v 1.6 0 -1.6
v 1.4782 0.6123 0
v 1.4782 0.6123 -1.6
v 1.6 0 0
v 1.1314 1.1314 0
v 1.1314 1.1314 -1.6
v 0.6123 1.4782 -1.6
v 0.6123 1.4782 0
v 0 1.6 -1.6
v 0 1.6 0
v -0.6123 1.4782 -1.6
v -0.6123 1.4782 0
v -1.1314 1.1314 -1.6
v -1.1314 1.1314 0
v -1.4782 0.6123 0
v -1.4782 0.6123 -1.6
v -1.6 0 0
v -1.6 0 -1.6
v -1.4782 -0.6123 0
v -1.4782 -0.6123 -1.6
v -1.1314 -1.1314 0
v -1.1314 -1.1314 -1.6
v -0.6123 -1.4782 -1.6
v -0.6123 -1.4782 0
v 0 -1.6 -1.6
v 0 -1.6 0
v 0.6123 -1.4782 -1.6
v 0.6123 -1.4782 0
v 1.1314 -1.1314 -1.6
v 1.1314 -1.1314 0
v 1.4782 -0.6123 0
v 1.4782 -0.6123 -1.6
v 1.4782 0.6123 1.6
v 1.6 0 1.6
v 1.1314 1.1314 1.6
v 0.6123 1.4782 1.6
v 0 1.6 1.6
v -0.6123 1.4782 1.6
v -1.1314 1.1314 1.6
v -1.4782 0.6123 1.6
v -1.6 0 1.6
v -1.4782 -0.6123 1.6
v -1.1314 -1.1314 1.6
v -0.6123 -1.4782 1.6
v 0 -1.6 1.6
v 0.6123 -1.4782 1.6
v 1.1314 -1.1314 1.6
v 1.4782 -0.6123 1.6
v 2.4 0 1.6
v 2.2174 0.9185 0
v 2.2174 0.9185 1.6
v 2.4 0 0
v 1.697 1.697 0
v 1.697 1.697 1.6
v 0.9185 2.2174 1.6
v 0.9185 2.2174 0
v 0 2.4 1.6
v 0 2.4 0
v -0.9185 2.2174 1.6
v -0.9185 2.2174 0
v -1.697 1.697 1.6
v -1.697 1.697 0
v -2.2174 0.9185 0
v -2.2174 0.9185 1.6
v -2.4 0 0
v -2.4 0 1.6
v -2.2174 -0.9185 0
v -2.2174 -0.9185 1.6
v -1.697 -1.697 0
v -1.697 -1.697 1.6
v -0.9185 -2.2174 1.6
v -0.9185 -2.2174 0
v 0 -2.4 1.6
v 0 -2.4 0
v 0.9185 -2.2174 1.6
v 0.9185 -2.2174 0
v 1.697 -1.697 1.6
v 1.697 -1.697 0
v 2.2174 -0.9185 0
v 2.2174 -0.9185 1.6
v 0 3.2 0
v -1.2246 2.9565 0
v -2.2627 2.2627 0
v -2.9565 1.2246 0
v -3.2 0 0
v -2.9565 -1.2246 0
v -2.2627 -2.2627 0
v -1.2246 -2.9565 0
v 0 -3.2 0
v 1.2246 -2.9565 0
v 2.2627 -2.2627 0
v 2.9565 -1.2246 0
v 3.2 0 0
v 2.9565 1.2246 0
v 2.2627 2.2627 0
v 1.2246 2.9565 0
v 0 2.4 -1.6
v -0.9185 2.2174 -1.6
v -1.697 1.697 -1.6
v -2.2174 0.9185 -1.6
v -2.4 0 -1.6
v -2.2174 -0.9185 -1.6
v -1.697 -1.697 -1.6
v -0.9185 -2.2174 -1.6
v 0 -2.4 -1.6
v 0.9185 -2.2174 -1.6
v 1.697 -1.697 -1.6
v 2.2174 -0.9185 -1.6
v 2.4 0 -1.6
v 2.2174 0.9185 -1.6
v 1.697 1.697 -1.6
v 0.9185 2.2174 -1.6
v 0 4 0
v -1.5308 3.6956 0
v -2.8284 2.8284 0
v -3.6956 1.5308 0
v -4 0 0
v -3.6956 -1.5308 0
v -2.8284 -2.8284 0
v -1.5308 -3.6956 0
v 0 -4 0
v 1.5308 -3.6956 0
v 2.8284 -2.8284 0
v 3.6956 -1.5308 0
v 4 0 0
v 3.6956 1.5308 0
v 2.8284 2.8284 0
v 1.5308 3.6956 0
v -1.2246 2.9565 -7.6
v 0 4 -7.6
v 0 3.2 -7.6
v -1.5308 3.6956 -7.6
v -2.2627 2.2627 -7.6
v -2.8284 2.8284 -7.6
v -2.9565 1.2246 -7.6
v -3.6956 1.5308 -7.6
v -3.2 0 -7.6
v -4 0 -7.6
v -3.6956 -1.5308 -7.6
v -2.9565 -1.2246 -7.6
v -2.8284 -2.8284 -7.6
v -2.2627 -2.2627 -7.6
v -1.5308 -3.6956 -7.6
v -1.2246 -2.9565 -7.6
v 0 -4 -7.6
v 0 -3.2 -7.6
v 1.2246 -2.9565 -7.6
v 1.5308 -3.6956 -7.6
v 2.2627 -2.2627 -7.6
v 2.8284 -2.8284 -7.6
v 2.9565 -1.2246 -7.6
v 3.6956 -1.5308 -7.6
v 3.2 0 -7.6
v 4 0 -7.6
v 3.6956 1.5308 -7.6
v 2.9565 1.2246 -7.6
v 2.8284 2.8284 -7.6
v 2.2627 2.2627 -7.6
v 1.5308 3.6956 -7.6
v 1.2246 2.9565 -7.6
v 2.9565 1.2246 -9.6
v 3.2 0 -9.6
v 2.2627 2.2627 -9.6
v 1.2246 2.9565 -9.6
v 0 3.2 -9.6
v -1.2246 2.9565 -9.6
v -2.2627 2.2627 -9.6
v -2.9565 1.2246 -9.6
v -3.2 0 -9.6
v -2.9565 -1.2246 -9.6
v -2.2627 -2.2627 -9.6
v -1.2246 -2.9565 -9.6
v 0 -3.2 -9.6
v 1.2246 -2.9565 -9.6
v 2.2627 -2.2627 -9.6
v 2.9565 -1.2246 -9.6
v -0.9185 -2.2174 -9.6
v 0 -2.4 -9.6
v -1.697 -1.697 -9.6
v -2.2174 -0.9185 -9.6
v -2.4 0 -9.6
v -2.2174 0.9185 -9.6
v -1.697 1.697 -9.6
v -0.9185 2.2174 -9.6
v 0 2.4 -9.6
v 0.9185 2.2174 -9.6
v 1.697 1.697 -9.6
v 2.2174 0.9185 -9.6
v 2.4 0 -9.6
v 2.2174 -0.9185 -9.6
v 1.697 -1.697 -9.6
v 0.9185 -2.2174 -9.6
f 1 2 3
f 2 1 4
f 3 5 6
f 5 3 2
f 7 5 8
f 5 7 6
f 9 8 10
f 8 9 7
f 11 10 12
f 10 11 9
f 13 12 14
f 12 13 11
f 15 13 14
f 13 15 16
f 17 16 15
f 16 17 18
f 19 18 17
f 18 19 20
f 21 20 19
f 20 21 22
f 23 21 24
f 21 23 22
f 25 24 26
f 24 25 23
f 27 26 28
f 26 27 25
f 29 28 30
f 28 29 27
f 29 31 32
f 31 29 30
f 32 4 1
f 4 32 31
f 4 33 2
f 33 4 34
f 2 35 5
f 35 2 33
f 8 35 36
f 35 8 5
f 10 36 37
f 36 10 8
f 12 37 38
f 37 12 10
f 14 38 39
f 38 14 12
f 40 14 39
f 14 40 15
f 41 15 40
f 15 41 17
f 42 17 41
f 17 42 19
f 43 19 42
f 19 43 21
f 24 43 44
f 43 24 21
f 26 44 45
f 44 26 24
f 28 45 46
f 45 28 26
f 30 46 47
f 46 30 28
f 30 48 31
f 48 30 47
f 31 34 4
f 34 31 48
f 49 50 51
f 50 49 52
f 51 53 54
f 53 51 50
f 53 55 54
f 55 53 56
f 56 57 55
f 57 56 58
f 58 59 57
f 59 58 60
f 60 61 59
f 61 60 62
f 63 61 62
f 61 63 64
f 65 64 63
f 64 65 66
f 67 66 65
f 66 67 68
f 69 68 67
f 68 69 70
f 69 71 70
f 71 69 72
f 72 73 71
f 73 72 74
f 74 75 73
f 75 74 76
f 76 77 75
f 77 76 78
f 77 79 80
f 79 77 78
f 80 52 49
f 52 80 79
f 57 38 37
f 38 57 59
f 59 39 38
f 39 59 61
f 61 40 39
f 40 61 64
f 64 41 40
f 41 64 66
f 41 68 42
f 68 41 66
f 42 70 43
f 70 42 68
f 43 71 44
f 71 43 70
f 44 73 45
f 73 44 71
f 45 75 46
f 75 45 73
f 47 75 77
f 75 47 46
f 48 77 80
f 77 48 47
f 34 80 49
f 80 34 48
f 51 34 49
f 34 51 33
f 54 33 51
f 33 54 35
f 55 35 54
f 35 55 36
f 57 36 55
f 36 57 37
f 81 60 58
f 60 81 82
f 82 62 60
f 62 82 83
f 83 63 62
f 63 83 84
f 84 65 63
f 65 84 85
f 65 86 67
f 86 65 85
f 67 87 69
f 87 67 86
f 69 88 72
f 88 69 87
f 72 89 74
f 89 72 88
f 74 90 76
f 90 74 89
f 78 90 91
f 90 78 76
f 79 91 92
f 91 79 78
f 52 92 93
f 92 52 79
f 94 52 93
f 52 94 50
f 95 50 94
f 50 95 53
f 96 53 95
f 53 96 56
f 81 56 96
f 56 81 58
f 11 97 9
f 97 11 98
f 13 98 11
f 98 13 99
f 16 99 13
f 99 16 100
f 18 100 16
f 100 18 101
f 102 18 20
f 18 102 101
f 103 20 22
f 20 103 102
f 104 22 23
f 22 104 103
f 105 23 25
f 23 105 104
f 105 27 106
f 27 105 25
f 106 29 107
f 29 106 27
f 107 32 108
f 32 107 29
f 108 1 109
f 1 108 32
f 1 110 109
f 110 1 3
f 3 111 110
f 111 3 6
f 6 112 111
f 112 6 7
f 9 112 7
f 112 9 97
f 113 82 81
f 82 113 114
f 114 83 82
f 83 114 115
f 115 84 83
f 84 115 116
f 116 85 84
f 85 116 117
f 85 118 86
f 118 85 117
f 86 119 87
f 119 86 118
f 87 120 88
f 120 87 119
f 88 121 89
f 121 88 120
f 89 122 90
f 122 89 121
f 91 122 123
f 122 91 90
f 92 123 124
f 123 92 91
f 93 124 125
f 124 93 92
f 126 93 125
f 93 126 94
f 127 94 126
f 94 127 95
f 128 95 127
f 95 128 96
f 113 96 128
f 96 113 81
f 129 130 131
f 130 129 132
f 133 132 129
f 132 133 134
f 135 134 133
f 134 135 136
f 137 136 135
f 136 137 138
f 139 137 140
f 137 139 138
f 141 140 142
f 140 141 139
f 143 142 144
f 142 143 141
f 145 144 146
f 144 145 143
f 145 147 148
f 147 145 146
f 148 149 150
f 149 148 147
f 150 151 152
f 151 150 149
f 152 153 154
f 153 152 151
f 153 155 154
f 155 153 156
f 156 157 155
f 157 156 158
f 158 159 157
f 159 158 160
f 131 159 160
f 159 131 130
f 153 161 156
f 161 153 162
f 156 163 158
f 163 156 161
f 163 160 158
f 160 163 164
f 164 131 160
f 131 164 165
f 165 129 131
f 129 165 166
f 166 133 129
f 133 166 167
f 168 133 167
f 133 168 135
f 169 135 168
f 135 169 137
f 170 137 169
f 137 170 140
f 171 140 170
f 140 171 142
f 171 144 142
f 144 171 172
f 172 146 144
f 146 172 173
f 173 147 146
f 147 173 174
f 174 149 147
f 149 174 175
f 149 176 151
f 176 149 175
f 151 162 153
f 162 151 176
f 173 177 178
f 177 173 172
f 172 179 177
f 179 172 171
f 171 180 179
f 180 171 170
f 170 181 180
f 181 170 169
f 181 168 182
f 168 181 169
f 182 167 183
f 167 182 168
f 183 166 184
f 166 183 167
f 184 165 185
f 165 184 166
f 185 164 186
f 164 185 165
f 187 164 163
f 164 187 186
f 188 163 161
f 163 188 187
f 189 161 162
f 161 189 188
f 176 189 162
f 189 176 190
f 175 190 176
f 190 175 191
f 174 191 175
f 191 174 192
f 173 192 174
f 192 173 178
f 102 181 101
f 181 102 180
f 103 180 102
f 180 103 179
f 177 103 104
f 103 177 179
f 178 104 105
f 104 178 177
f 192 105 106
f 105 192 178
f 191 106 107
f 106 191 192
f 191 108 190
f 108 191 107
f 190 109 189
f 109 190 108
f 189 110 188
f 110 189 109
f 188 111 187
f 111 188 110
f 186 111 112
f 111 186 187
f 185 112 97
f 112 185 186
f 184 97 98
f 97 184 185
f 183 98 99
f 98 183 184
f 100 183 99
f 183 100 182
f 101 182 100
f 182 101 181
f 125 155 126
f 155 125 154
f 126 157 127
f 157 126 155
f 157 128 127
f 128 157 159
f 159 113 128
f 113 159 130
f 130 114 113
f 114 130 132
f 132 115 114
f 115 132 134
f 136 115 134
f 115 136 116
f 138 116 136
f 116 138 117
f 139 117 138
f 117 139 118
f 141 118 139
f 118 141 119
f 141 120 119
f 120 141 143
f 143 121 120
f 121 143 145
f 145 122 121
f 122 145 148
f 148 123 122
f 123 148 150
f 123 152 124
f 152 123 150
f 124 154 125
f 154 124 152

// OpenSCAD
// file: ../p/stud4od.scad
use <../lib.scad>
use <4-4cylo.scad>
use <4-4ring3.scad>
function ldraw_lib__stud4od() = [
// 0 Stud Tube Open without Outer Cylinder and Top Surface
// 0 Name: stud4od.dat
// 0 Author: Philippe Hurbain [Philo]
// 0 !LDRAW_ORG Primitive UPDATE 2013-02
// 0 !LICENSE Licensed under CC BY 4.0 : see CAreadme.txt
// 
// 0 !HELP This stud is a "antistud" to be used like a underside stud,
// 0 !HELP but without the outer cylinder.
// 0 !HELP 1 47 0 0 0 1 0 0 0 1 0 0 0 1 stud4.dat
// 
// 0 BFC CERTIFY CCW
  [0,"BFC","CERTIFY"],
  [0,"BFC","CCW"],
// 
// 0 !HISTORY 2013-12-23 [PTadmin] Official Update 2013-02
// 
// 
// 1 16 0 -4 0 2 0 0 0 1 0 0 0 2 4-4ring3.dat
  [1,16,0,-4,0,2,0,0,0,1,0,0,0,2, ldraw_lib__4_4ring3()],
// 0 BFC INVERTNEXT
  [0,"BFC","INVERTNEXT"],
// 1 16 0 0 0 -6 0 0 0 -4 0 0 0 6 4-4cylo.dat
  [1,16,0,0,0,-6,0,0,0,-4,0,0,0,6, ldraw_lib__4_4cylo()],
];
module ldraw_lib__stud4od(step=0, col=false, unit=2/5, alt=false, line=0.2, solid=!$preview)
    makepoly(ldraw_lib__stud4od(), step=step, col=col, unit=unit, alt=alt, line=line, solid=solid);
ldraw_lib__stud4od(line=0.2);
// file: ../p/stud2a.scad
use <../lib.scad>
use <4-4cyli.scad>
use <4-4edge.scad>
use <4-4ring2.scad>
function ldraw_lib__stud2a() = [
// 0 Stud Open without Base Edges
// 0 Name: stud2a.dat
// 0 Author: James Jessiman
// 0 !LDRAW_ORG Primitive UPDATE 2009-02
// 0 !LICENSE Licensed under CC BY 4.0 : see CAreadme.txt
// 
// 0 BFC CERTIFY CCW
  [0,"BFC","CERTIFY"],
  [0,"BFC","CCW"],
// 
// 0 !HISTORY 1999-07-05 [PTadmin] Official Update 1999-05
// 0 !HISTORY 2002-04-04 [sbliss] Modified for BFC compliance
// 0 !HISTORY 2002-04-25 [PTadmin] Official Update 2002-02
// 0 !HISTORY 2007-06-24 [PTadmin] Header formatted for Contributor Agreement
// 0 !HISTORY 2008-07-01 [PTadmin] Official Update 2008-01
// 0 !HISTORY 2009-06-21 [cwdee] Update ring references to 4-4ring
// 0 !HISTORY 2009-09-03 [PTadmin] Official Update 2009-02
// 
// 
// 1 16 0 -4 0 4 0 0 0 1 0 0 0 4 4-4edge.dat
  [1,16,0,-4,0,4,0,0,0,1,0,0,0,4, ldraw_lib__4_4edge()],
// 1 16 0 -4 0 6 0 0 0 1 0 0 0 6 4-4edge.dat
  [1,16,0,-4,0,6,0,0,0,1,0,0,0,6, ldraw_lib__4_4edge()],
// 0 BFC INVERTNEXT
  [0,"BFC","INVERTNEXT"],
// 1 16 0 -4 0 4 0 0 0 4 0 0 0 4 4-4cyli.dat
  [1,16,0,-4,0,4,0,0,0,4,0,0,0,4, ldraw_lib__4_4cyli()],
// 1 16 0 -4 0 6 0 0 0 4 0 0 0 6 4-4cyli.dat
  [1,16,0,-4,0,6,0,0,0,4,0,0,0,6, ldraw_lib__4_4cyli()],
// 1 16 0 -4 0 2 0 0 0 1 0 0 0 2 4-4ring2.dat
  [1,16,0,-4,0,2,0,0,0,1,0,0,0,2, ldraw_lib__4_4ring2()],
// 0
];
module ldraw_lib__stud2a(step=0, col=false, unit=2/5, alt=false, line=0.2, solid=!$preview)
    makepoly(ldraw_lib__stud2a(), step=step, col=col, unit=unit, alt=alt, line=line, solid=solid);
ldraw_lib__stud2a(line=0.2);
// file: ../p/4-4ring4.scad
use <../lib.scad>
function ldraw_lib__4_4ring4() = [
// 0 Ring  4 x 1.0
// 0 Name: 4-4ring4.dat
// 0 Author: James Jessiman
// 0 !LDRAW_ORG Primitive UPDATE 2009-01
// 0 !LICENSE Licensed under CC BY 4.0 : see CAreadme.txt
// 
// 0 BFC CERTIFY CCW
  [0,"BFC","CERTIFY"],
  [0,"BFC","CCW"],
// 
// 0 !HISTORY 1998-12-15 [PTadmin] Official Update 1998-10
// 0 !HISTORY 2002-04-08 [BrickCaster] Modified for BFC compliance
// 0 !HISTORY 2002-04-25 [PTadmin] Official Update 2002-02
// 0 !HISTORY 2007-06-24 [PTadmin] Header formatted for Contributor Agreement
// 0 !HISTORY 2008-07-01 [PTadmin] Official Update 2008-01
// 0 !HISTORY 2008-08-26 [cwdee] Switch polygon winding and rename
// 0 !HISTORY 2009-05-02 [PTadmin] Official Update 2009-01
// 
// 
// 4 16 -1.9135 0 4.6195 -1.5308 0 3.6956 0 0 4 0 0 5
  [4,16,-1.9135,0,4.6195,-1.5308,0,3.6956,0,0,4,0,0,5],
// 4 16 -3.5355 0 3.5355 -2.8284 0 2.8284 -1.5308 0 3.6956 -1.9135 0 4.6195
  [4,16,-3.5355,0,3.5355,-2.8284,0,2.8284,-1.5308,0,3.6956,-1.9135,0,4.6195],
// 4 16 -4.6195 0 1.9135 -3.6956 0 1.5308 -2.8284 0 2.8284 -3.5355 0 3.5355
  [4,16,-4.6195,0,1.9135,-3.6956,0,1.5308,-2.8284,0,2.8284,-3.5355,0,3.5355],
// 4 16 -5 0 0 -4 0 0 -3.6956 0 1.5308 -4.6195 0 1.9135
  [4,16,-5,0,0,-4,0,0,-3.6956,0,1.5308,-4.6195,0,1.9135],
// 4 16 -4.6195 0 -1.9135 -3.6956 0 -1.5308 -4 0 0 -5 0 0
  [4,16,-4.6195,0,-1.9135,-3.6956,0,-1.5308,-4,0,0,-5,0,0],
// 4 16 -3.5355 0 -3.5355 -2.8284 0 -2.8284 -3.6956 0 -1.5308 -4.6195 0 -1.9135
  [4,16,-3.5355,0,-3.5355,-2.8284,0,-2.8284,-3.6956,0,-1.5308,-4.6195,0,-1.9135],
// 4 16 -1.9135 0 -4.6195 -1.5308 0 -3.6956 -2.8284 0 -2.8284 -3.5355 0 -3.5355
  [4,16,-1.9135,0,-4.6195,-1.5308,0,-3.6956,-2.8284,0,-2.8284,-3.5355,0,-3.5355],
// 4 16 0 0 -5 0 0 -4 -1.5308 0 -3.6956 -1.9135 0 -4.6195
  [4,16,0,0,-5,0,0,-4,-1.5308,0,-3.6956,-1.9135,0,-4.6195],
// 4 16 1.9135 0 -4.6195 1.5308 0 -3.6956 0 0 -4 0 0 -5
  [4,16,1.9135,0,-4.6195,1.5308,0,-3.6956,0,0,-4,0,0,-5],
// 4 16 3.5355 0 -3.5355 2.8284 0 -2.8284 1.5308 0 -3.6956 1.9135 0 -4.6195
  [4,16,3.5355,0,-3.5355,2.8284,0,-2.8284,1.5308,0,-3.6956,1.9135,0,-4.6195],
// 4 16 4.6195 0 -1.9135 3.6956 0 -1.5308 2.8284 0 -2.8284 3.5355 0 -3.5355
  [4,16,4.6195,0,-1.9135,3.6956,0,-1.5308,2.8284,0,-2.8284,3.5355,0,-3.5355],
// 4 16 5 0 0 4 0 0 3.6956 0 -1.5308 4.6195 0 -1.9135
  [4,16,5,0,0,4,0,0,3.6956,0,-1.5308,4.6195,0,-1.9135],
// 4 16 4.6195 0 1.9135 3.6956 0 1.5308 4 0 0 5 0 0
  [4,16,4.6195,0,1.9135,3.6956,0,1.5308,4,0,0,5,0,0],
// 4 16 3.5355 0 3.5355 2.8284 0 2.8284 3.6956 0 1.5308 4.6195 0 1.9135
  [4,16,3.5355,0,3.5355,2.8284,0,2.8284,3.6956,0,1.5308,4.6195,0,1.9135],
// 4 16 1.9135 0 4.6195 1.5308 0 3.6956 2.8284 0 2.8284 3.5355 0 3.5355
  [4,16,1.9135,0,4.6195,1.5308,0,3.6956,2.8284,0,2.8284,3.5355,0,3.5355],
// 4 16 0 0 5 0 0 4 1.5308 0 3.6956 1.9135 0 4.6195
  [4,16,0,0,5,0,0,4,1.5308,0,3.6956,1.9135,0,4.6195],
// 0
];
module ldraw_lib__4_4ring4(step=0, col=false, unit=2/5, alt=false, line=0.2, solid=!$preview)
    makepoly(ldraw_lib__4_4ring4(), step=step, col=col, unit=unit, alt=alt, line=line, solid=solid);
ldraw_lib__4_4ring4(line=0.2);
// file: ../p/4-4ring3.scad
use <../lib.scad>
function ldraw_lib__4_4ring3() = [
// 0 Ring  3 x 1.0
// 0 Name: 4-4ring3.dat
// 0 Author: James Jessiman
// 0 !LDRAW_ORG Primitive UPDATE 2009-01
// 0 !LICENSE Licensed under CC BY 4.0 : see CAreadme.txt
// 
// 0 BFC CERTIFY CCW
  [0,"BFC","CERTIFY"],
  [0,"BFC","CCW"],
// 
// 0 !HISTORY 1998-12-15 [PTadmin] Official Update 1998-10
// 0 !HISTORY 2002-04-05 [hafhead] Added BFC statement
// 0 !HISTORY 2002-04-25 [PTadmin] Official Update 2002-02
// 0 !HISTORY 2007-06-24 [PTadmin] Header formatted for Contributor Agreement
// 0 !HISTORY 2008-07-01 [PTadmin] Official Update 2008-01
// 0 !HISTORY 2008-08-26 [cwdee] Switch polygon winding and rename
// 0 !HISTORY 2009-05-02 [PTadmin] Official Update 2009-01
// 
// 
// 4 16 -1.5308 0 3.6956 -1.1481 0 2.7717 0 0 3 0 0 4
  [4,16,-1.5308,0,3.6956,-1.1481,0,2.7717,0,0,3,0,0,4],
// 4 16 -2.8284 0 2.8284 -2.1213 0 2.1213 -1.1481 0 2.7717 -1.5308 0 3.6956
  [4,16,-2.8284,0,2.8284,-2.1213,0,2.1213,-1.1481,0,2.7717,-1.5308,0,3.6956],
// 4 16 -3.6956 0 1.5308 -2.7717 0 1.1481 -2.1213 0 2.1213 -2.8284 0 2.8284
  [4,16,-3.6956,0,1.5308,-2.7717,0,1.1481,-2.1213,0,2.1213,-2.8284,0,2.8284],
// 4 16 -4 0 0 -3 0 0 -2.7717 0 1.1481 -3.6956 0 1.5308
  [4,16,-4,0,0,-3,0,0,-2.7717,0,1.1481,-3.6956,0,1.5308],
// 4 16 -3.6956 0 -1.5308 -2.7717 0 -1.1481 -3 0 0 -4 0 0
  [4,16,-3.6956,0,-1.5308,-2.7717,0,-1.1481,-3,0,0,-4,0,0],
// 4 16 -2.8284 0 -2.8284 -2.1213 0 -2.1213 -2.7717 0 -1.1481 -3.6956 0 -1.5308
  [4,16,-2.8284,0,-2.8284,-2.1213,0,-2.1213,-2.7717,0,-1.1481,-3.6956,0,-1.5308],
// 4 16 -1.5308 0 -3.6956 -1.1481 0 -2.7717 -2.1213 0 -2.1213 -2.8284 0 -2.8284
  [4,16,-1.5308,0,-3.6956,-1.1481,0,-2.7717,-2.1213,0,-2.1213,-2.8284,0,-2.8284],
// 4 16 0 0 -4 0 0 -3 -1.1481 0 -2.7717 -1.5308 0 -3.6956
  [4,16,0,0,-4,0,0,-3,-1.1481,0,-2.7717,-1.5308,0,-3.6956],
// 4 16 1.5308 0 -3.6956 1.1481 0 -2.7717 0 0 -3 0 0 -4
  [4,16,1.5308,0,-3.6956,1.1481,0,-2.7717,0,0,-3,0,0,-4],
// 4 16 2.8284 0 -2.8284 2.1213 0 -2.1213 1.1481 0 -2.7717 1.5308 0 -3.6956
  [4,16,2.8284,0,-2.8284,2.1213,0,-2.1213,1.1481,0,-2.7717,1.5308,0,-3.6956],
// 4 16 3.6956 0 -1.5308 2.7717 0 -1.1481 2.1213 0 -2.1213 2.8284 0 -2.8284
  [4,16,3.6956,0,-1.5308,2.7717,0,-1.1481,2.1213,0,-2.1213,2.8284,0,-2.8284],
// 4 16 4 0 0 3 0 0 2.7717 0 -1.1481 3.6956 0 -1.5308
  [4,16,4,0,0,3,0,0,2.7717,0,-1.1481,3.6956,0,-1.5308],
// 4 16 3.6956 0 1.5308 2.7717 0 1.1481 3 0 0 4 0 0
  [4,16,3.6956,0,1.5308,2.7717,0,1.1481,3,0,0,4,0,0],
// 4 16 2.8284 0 2.8284 2.1213 0 2.1213 2.7717 0 1.1481 3.6956 0 1.5308
  [4,16,2.8284,0,2.8284,2.1213,0,2.1213,2.7717,0,1.1481,3.6956,0,1.5308],
// 4 16 1.5308 0 3.6956 1.1481 0 2.7717 2.1213 0 2.1213 2.8284 0 2.8284
  [4,16,1.5308,0,3.6956,1.1481,0,2.7717,2.1213,0,2.1213,2.8284,0,2.8284],
// 4 16 0 0 4 0 0 3 1.1481 0 2.7717 1.5308 0 3.6956
  [4,16,0,0,4,0,0,3,1.1481,0,2.7717,1.5308,0,3.6956],
// 0
];
module ldraw_lib__4_4ring3(step=0, col=false, unit=2/5, alt=false, line=0.2, solid=!$preview)
    makepoly(ldraw_lib__4_4ring3(), step=step, col=col, unit=unit, alt=alt, line=line, solid=solid);
ldraw_lib__4_4ring3(line=0.2);
// file: ../p/4-4ring2.scad
use <../lib.scad>
function ldraw_lib__4_4ring2() = [
// 0 Ring  2 x 1.0
// 0 Name: 4-4ring2.dat
// 0 Author: James Jessiman
// 0 !LDRAW_ORG Primitive UPDATE 2009-01
// 0 !LICENSE Licensed under CC BY 4.0 : see CAreadme.txt
// 
// 0 BFC CERTIFY CCW
  [0,"BFC","CERTIFY"],
  [0,"BFC","CCW"],
// 
// 0 !HISTORY 1998-12-15 [PTadmin] Official Update 1998-10
// 0 !HISTORY 2002-04-05 [hafhead] Added BFC statement
// 0 !HISTORY 2002-04-25 [PTadmin] Official Update 2002-02
// 0 !HISTORY 2007-06-24 [PTadmin] Header formatted for Contributor Agreement
// 0 !HISTORY 2008-07-01 [PTadmin] Official Update 2008-01
// 0 !HISTORY 2008-08-26 [cwdee] Switch polygon winding and rename
// 0 !HISTORY 2009-05-02 [PTadmin] Official Update 2009-01
// 
// 
// 4 16 -1.1481 0 2.7717 -0.7654 0 1.8478 0 0 2 0 0 3
  [4,16,-1.1481,0,2.7717,-0.7654,0,1.8478,0,0,2,0,0,3],
// 4 16 -2.1213 0 2.1213 -1.4142 0 1.4142 -0.7654 0 1.8478 -1.1481 0 2.7717
  [4,16,-2.1213,0,2.1213,-1.4142,0,1.4142,-0.7654,0,1.8478,-1.1481,0,2.7717],
// 4 16 -2.7717 0 1.1481 -1.8478 0 0.7654 -1.4142 0 1.4142 -2.1213 0 2.1213
  [4,16,-2.7717,0,1.1481,-1.8478,0,0.7654,-1.4142,0,1.4142,-2.1213,0,2.1213],
// 4 16 -3 0 0 -2 0 0 -1.8478 0 0.7654 -2.7717 0 1.1481
  [4,16,-3,0,0,-2,0,0,-1.8478,0,0.7654,-2.7717,0,1.1481],
// 4 16 -2.7717 0 -1.1481 -1.8478 0 -0.7654 -2 0 0 -3 0 0
  [4,16,-2.7717,0,-1.1481,-1.8478,0,-0.7654,-2,0,0,-3,0,0],
// 4 16 -2.1213 0 -2.1213 -1.4142 0 -1.4142 -1.8478 0 -0.7654 -2.7717 0 -1.1481
  [4,16,-2.1213,0,-2.1213,-1.4142,0,-1.4142,-1.8478,0,-0.7654,-2.7717,0,-1.1481],
// 4 16 -1.1481 0 -2.7717 -0.7654 0 -1.8478 -1.4142 0 -1.4142 -2.1213 0 -2.1213
  [4,16,-1.1481,0,-2.7717,-0.7654,0,-1.8478,-1.4142,0,-1.4142,-2.1213,0,-2.1213],
// 4 16 0 0 -3 0 0 -2 -0.7654 0 -1.8478 -1.1481 0 -2.7717
  [4,16,0,0,-3,0,0,-2,-0.7654,0,-1.8478,-1.1481,0,-2.7717],
// 4 16 1.1481 0 -2.7717 0.7654 0 -1.8478 0 0 -2 0 0 -3
  [4,16,1.1481,0,-2.7717,0.7654,0,-1.8478,0,0,-2,0,0,-3],
// 4 16 2.1213 0 -2.1213 1.4142 0 -1.4142 0.7654 0 -1.8478 1.1481 0 -2.7717
  [4,16,2.1213,0,-2.1213,1.4142,0,-1.4142,0.7654,0,-1.8478,1.1481,0,-2.7717],
// 4 16 2.7717 0 -1.1481 1.8478 0 -0.7654 1.4142 0 -1.4142 2.1213 0 -2.1213
  [4,16,2.7717,0,-1.1481,1.8478,0,-0.7654,1.4142,0,-1.4142,2.1213,0,-2.1213],
// 4 16 3 0 0 2 0 0 1.8478 0 -0.7654 2.7717 0 -1.1481
  [4,16,3,0,0,2,0,0,1.8478,0,-0.7654,2.7717,0,-1.1481],
// 4 16 2.7717 0 1.1481 1.8478 0 0.7654 2 0 0 3 0 0
  [4,16,2.7717,0,1.1481,1.8478,0,0.7654,2,0,0,3,0,0],
// 4 16 2.1213 0 2.1213 1.4142 0 1.4142 1.8478 0 0.7654 2.7717 0 1.1481
  [4,16,2.1213,0,2.1213,1.4142,0,1.4142,1.8478,0,0.7654,2.7717,0,1.1481],
// 4 16 1.1481 0 2.7717 0.7654 0 1.8478 1.4142 0 1.4142 2.1213 0 2.1213
  [4,16,1.1481,0,2.7717,0.7654,0,1.8478,1.4142,0,1.4142,2.1213,0,2.1213],
// 4 16 0 0 3 0 0 2 0.7654 0 1.8478 1.1481 0 2.7717
  [4,16,0,0,3,0,0,2,0.7654,0,1.8478,1.1481,0,2.7717],
// 0
];
module ldraw_lib__4_4ring2(step=0, col=false, unit=2/5, alt=false, line=0.2, solid=!$preview)
    makepoly(ldraw_lib__4_4ring2(), step=step, col=col, unit=unit, alt=alt, line=line, solid=solid);
ldraw_lib__4_4ring2(line=0.2);
// file: ../p/4-4edge.scad
use <../lib.scad>
function ldraw_lib__4_4edge() = [
// 0 Circle 1.0
// 0 Name: 4-4edge.dat
// 0 Author: James Jessiman
// 0 !LDRAW_ORG Primitive UPDATE 2017-01
// 0 !LICENSE Licensed under CC BY 4.0 : see CAreadme.txt
// 
// 0 BFC CERTIFY CCW
  [0,"BFC","CERTIFY"],
  [0,"BFC","CCW"],
// 
// 0 !HISTORY 1998-12-15 [PTadmin] Official Update 1998-10
// 0 !HISTORY 2005-12-28 [PTadmin] Official Update 2005-01
// 0 !HISTORY 2007-06-24 [PTadmin] Header formatted for Contributor Agreement
// 0 !HISTORY 2008-07-01 [PTadmin] Official Update 2008-01
// 0 !HISTORY 2017-01-15 [Steffen] BFCed
// 0 !HISTORY 2017-12-30 [PTadmin] Official Update 2017-01
// 
// 
// 2 24 1 0 0 0.9239 0 0.3827
  [2,24,1,0,0,0.9239,0,0.3827],
// 2 24 0.9239 0 0.3827 0.7071 0 0.7071
  [2,24,0.9239,0,0.3827,0.7071,0,0.7071],
// 2 24 0.7071 0 0.7071 0.3827 0 0.9239
  [2,24,0.7071,0,0.7071,0.3827,0,0.9239],
// 2 24 0.3827 0 0.9239 0 0 1
  [2,24,0.3827,0,0.9239,0,0,1],
// 2 24 0 0 1 -0.3827 0 0.9239
  [2,24,0,0,1,-0.3827,0,0.9239],
// 2 24 -0.3827 0 0.9239 -0.7071 0 0.7071
  [2,24,-0.3827,0,0.9239,-0.7071,0,0.7071],
// 2 24 -0.7071 0 0.7071 -0.9239 0 0.3827
  [2,24,-0.7071,0,0.7071,-0.9239,0,0.3827],
// 2 24 -0.9239 0 0.3827 -1 0 -0
  [2,24,-0.9239,0,0.3827,-1,0,-0],
// 2 24 -1 0 -0 -0.9239 0 -0.3827
  [2,24,-1,0,-0,-0.9239,0,-0.3827],
// 2 24 -0.9239 0 -0.3827 -0.7071 0 -0.7071
  [2,24,-0.9239,0,-0.3827,-0.7071,0,-0.7071],
// 2 24 -0.7071 0 -0.7071 -0.3827 0 -0.9239
  [2,24,-0.7071,0,-0.7071,-0.3827,0,-0.9239],
// 2 24 -0.3827 0 -0.9239 0 0 -1
  [2,24,-0.3827,0,-0.9239,0,0,-1],
// 2 24 0 0 -1 0.3827 0 -0.9239
  [2,24,0,0,-1,0.3827,0,-0.9239],
// 2 24 0.3827 0 -0.9239 0.7071 0 -0.7071
  [2,24,0.3827,0,-0.9239,0.7071,0,-0.7071],
// 2 24 0.7071 0 -0.7071 0.9239 0 -0.3827
  [2,24,0.7071,0,-0.7071,0.9239,0,-0.3827],
// 2 24 0.9239 0 -0.3827 1 0 0
  [2,24,0.9239,0,-0.3827,1,0,0],
];
module ldraw_lib__4_4edge(step=0, col=false, unit=2/5, alt=false, line=0.2, solid=!$preview)
    makepoly(ldraw_lib__4_4edge(), step=step, col=col, unit=unit, alt=alt, line=line, solid=solid);
ldraw_lib__4_4edge(line=0.2);
// file: ../p/4-4cylo.scad
use <../lib.scad>
use <4-4cyli.scad>
use <4-4edge.scad>
function ldraw_lib__4_4cylo() = [
// 0 Cylinder Open 1.0
// 0 Name: 4-4cylo.dat
// 0 Author: Mark Kennedy [mkennedy]
// 0 !LDRAW_ORG Primitive UPDATE 2010-01
// 0 !LICENSE Licensed under CC BY 4.0 : see CAreadme.txt
// 
// 0 BFC CERTIFY CCW
  [0,"BFC","CERTIFY"],
  [0,"BFC","CCW"],
// 
// 0 !HISTORY 2010-04-05 [PTadmin] Official Update 2010-01
// 
// 
// 1 16 0 0 0 1 0 0 0 1 0 0 0 1 4-4edge.dat
  [1,16,0,0,0,1,0,0,0,1,0,0,0,1, ldraw_lib__4_4edge()],
// 1 16 0 1 0 1 0 0 0 1 0 0 0 1 4-4edge.dat
  [1,16,0,1,0,1,0,0,0,1,0,0,0,1, ldraw_lib__4_4edge()],
// 1 16 0 0 0 1 0 0 0 1 0 0 0 1 4-4cyli.dat
  [1,16,0,0,0,1,0,0,0,1,0,0,0,1, ldraw_lib__4_4cyli()],
// 0
];
module ldraw_lib__4_4cylo(step=0, col=false, unit=2/5, alt=false, line=0.2, solid=!$preview)
    makepoly(ldraw_lib__4_4cylo(), step=step, col=col, unit=unit, alt=alt, line=line, solid=solid);
ldraw_lib__4_4cylo(line=0.2);
// file: s/3062bs01.scad
use <../../lib.scad>
use <../../p/4-4cyli.scad>
use <../../p/4-4cylo.scad>
use <../../p/4-4edge.scad>
use <../../p/4-4ring2.scad>
use <../../p/4-4ring3.scad>
use <../../p/4-4ring4.scad>
use <../../p/stud2a.scad>
use <../../p/stud4od.scad>
function ldraw_lib__s__3062bs01() = [
// 0 ~Brick  1 x  1 Round with Hollow Stud without Outer Surface
// 0 Name: s\3062bs01.dat
// 0 Author: Takeshi Takahashi [RainbowDolphin]
// 0 !LDRAW_ORG Subpart UPDATE 2022-02
// 0 !LICENSE Licensed under CC BY 4.0 : see CAreadme.txt
// 
// 0 BFC CERTIFY CCW
  [0,"BFC","CERTIFY"],
  [0,"BFC","CCW"],
// 
// 0 !HISTORY 2022-03-06 [PTadmin] Official Update 2022-02
// 
// 
// 1 16 0 4 0 4 0 0 0 1 0 0 0 4 4-4edge.dat
  [1,16,0,4,0,4,0,0,0,1,0,0,0,4, ldraw_lib__4_4edge()],
// 1 16 0 19 0 10 0 0 0 1 0 0 0 10 4-4edge.dat
  [1,16,0,19,0,10,0,0,0,1,0,0,0,10, ldraw_lib__4_4edge()],
// 1 16 0 0 0 10 0 0 0 1 0 0 0 10 4-4edge.dat
  [1,16,0,0,0,10,0,0,0,1,0,0,0,10, ldraw_lib__4_4edge()],
// 1 16 0 0 0 6 0 0 0 1 0 0 0 6 4-4edge.dat
  [1,16,0,0,0,6,0,0,0,1,0,0,0,6, ldraw_lib__4_4edge()],
// 0 BFC INVERTNEXT
  [0,"BFC","INVERTNEXT"],
// 1 16 0 0 0 4 0 0 0 4 0 0 0 4 4-4cyli.dat
  [1,16,0,0,0,4,0,0,0,4,0,0,0,4, ldraw_lib__4_4cyli()],
// 1 16 0 0 0 1 0 0 0 1 0 0 0 1 stud2a.dat
  [1,16,0,0,0,1,0,0,0,1,0,0,0,1, ldraw_lib__stud2a()],
// 1 16 0 0 0 2 0 0 0 1 0 0 0 2 4-4ring3.dat
  [1,16,0,0,0,2,0,0,0,1,0,0,0,2, ldraw_lib__4_4ring3()],
// 1 16 0 4 0 2 0 0 0 -1 0 0 0 2 4-4ring2.dat
  [1,16,0,4,0,2,0,0,0,-1,0,0,0,2, ldraw_lib__4_4ring2()],
// 1 16 0 0 0 2 0 0 0 1 0 0 0 2 4-4ring4.dat
  [1,16,0,0,0,2,0,0,0,1,0,0,0,2, ldraw_lib__4_4ring4()],
// 1 16 0 19 0 2 0 0 0 -1 0 0 0 2 4-4ring4.dat
  [1,16,0,19,0,2,0,0,0,-1,0,0,0,2, ldraw_lib__4_4ring4()],
// 1 16 0 19 0 8 0 0 0 5 0 0 0 8 4-4cylo.dat
  [1,16,0,19,0,8,0,0,0,5,0,0,0,8, ldraw_lib__4_4cylo()],
// 1 16 0 4 0 1 0 0 0 -5 0 0 0 -1 stud4od.dat
  [1,16,0,4,0,1,0,0,0,-5,0,0,0,-1, ldraw_lib__stud4od()],
];
module ldraw_lib__s__3062bs01(step=0, col=false, unit=2/5, alt=false, line=0.2, solid=!$preview)
    makepoly(ldraw_lib__s__3062bs01(), step=step, col=col, unit=unit, alt=alt, line=line, solid=solid);
ldraw_lib__s__3062bs01(line=0.2);
// file: ../p/4-4cyli.scad
use <../lib.scad>
function ldraw_lib__4_4cyli() = [
// 0 Cylinder 1.0
// 0 Name: 4-4cyli.dat
// 0 Author: James Jessiman
// 0 !LDRAW_ORG Primitive UPDATE 2005-01
// 0 !LICENSE Licensed under CC BY 4.0 : see CAreadme.txt
// 
// 0 BFC CERTIFY CCW
  [0,"BFC","CERTIFY"],
  [0,"BFC","CCW"],
// 
// 0 !HISTORY 1998-12-15 [PTadmin] Official Update 1998-10
// 0 !HISTORY 2002-03-23 [sbliss] Added BFC statement; merged headers from files in distributions LDraw 0.27 and Complete.
// 0 !HISTORY 2002-04-25 [PTadmin] Official Update 2002-02
// 0 !HISTORY 2004-12-14 [guyvivan] BFC CCW
// 0 !HISTORY 2005-12-28 [PTadmin] Official Update 2005-01
// 0 !HISTORY 2007-06-24 [PTadmin] Header formatted for Contributor Agreement
// 0 !HISTORY 2008-07-01 [PTadmin] Official Update 2008-01
// 
// 
// 4 16 1 1 0 0.9239 1 0.3827 0.9239 0 0.3827 1 0 0
  [4,16,1,1,0,0.9239,1,0.3827,0.9239,0,0.3827,1,0,0],
// 5 24 1 0 0 1 1 0 0.9239 0 0.3827 0.9239 0 -0.3827
  [5,24,1,0,0,1,1,0,0.9239,0,0.3827,0.9239,0,-0.3827],
// 4 16 0.9239 1 0.3827 0.7071 1 0.7071 0.7071 0 0.7071 0.9239 0 0.3827
  [4,16,0.9239,1,0.3827,0.7071,1,0.7071,0.7071,0,0.7071,0.9239,0,0.3827],
// 5 24 0.9239 0 0.3827 0.9239 1 0.3827 0.7071 0 0.7071 1 0 0
  [5,24,0.9239,0,0.3827,0.9239,1,0.3827,0.7071,0,0.7071,1,0,0],
// 4 16 0.7071 1 0.7071 0.3827 1 0.9239 0.3827 0 0.9239 0.7071 0 0.7071
  [4,16,0.7071,1,0.7071,0.3827,1,0.9239,0.3827,0,0.9239,0.7071,0,0.7071],
// 5 24 0.7071 0 0.7071 0.7071 1 0.7071 0.3827 0 0.9239 0.9239 0 0.3827
  [5,24,0.7071,0,0.7071,0.7071,1,0.7071,0.3827,0,0.9239,0.9239,0,0.3827],
// 4 16 0.3827 1 0.9239 0 1 1 0 0 1 0.3827 0 0.9239
  [4,16,0.3827,1,0.9239,0,1,1,0,0,1,0.3827,0,0.9239],
// 5 24 0.3827 0 0.9239 0.3827 1 0.9239 0 0 1 0.7071 0 0.7071
  [5,24,0.3827,0,0.9239,0.3827,1,0.9239,0,0,1,0.7071,0,0.7071],
// 4 16 0 1 1 -0.3827 1 0.9239 -0.3827 0 0.9239 0 0 1
  [4,16,0,1,1,-0.3827,1,0.9239,-0.3827,0,0.9239,0,0,1],
// 5 24 0 0 1 0 1 1 -0.3827 0 0.9239 0.3827 0 0.9239
  [5,24,0,0,1,0,1,1,-0.3827,0,0.9239,0.3827,0,0.9239],
// 4 16 -0.3827 1 0.9239 -0.7071 1 0.7071 -0.7071 0 0.7071 -0.3827 0 0.9239
  [4,16,-0.3827,1,0.9239,-0.7071,1,0.7071,-0.7071,0,0.7071,-0.3827,0,0.9239],
// 5 24 -0.3827 0 0.9239 -0.3827 1 0.9239 -0.7071 0 0.7071 0 0 1
  [5,24,-0.3827,0,0.9239,-0.3827,1,0.9239,-0.7071,0,0.7071,0,0,1],
// 4 16 -0.7071 1 0.7071 -0.9239 1 0.3827 -0.9239 0 0.3827 -0.7071 0 0.7071
  [4,16,-0.7071,1,0.7071,-0.9239,1,0.3827,-0.9239,0,0.3827,-0.7071,0,0.7071],
// 5 24 -0.7071 0 0.7071 -0.7071 1 0.7071 -0.9239 0 0.3827 -0.3827 0 0.9239
  [5,24,-0.7071,0,0.7071,-0.7071,1,0.7071,-0.9239,0,0.3827,-0.3827,0,0.9239],
// 4 16 -0.9239 1 0.3827 -1 1 0 -1 0 0 -0.9239 0 0.3827
  [4,16,-0.9239,1,0.3827,-1,1,0,-1,0,0,-0.9239,0,0.3827],
// 5 24 -0.9239 0 0.3827 -0.9239 1 0.3827 -1 0 0 -0.7071 0 0.7071
  [5,24,-0.9239,0,0.3827,-0.9239,1,0.3827,-1,0,0,-0.7071,0,0.7071],
// 4 16 -1 1 0 -0.9239 1 -0.3827 -0.9239 0 -0.3827 -1 0 0
  [4,16,-1,1,0,-0.9239,1,-0.3827,-0.9239,0,-0.3827,-1,0,0],
// 5 24 -1 0 0 -1 1 0 -0.9239 0 -0.3827 -0.9239 0 0.3827
  [5,24,-1,0,0,-1,1,0,-0.9239,0,-0.3827,-0.9239,0,0.3827],
// 4 16 -0.9239 1 -0.3827 -0.7071 1 -0.7071 -0.7071 0 -0.7071 -0.9239 0 -0.3827
  [4,16,-0.9239,1,-0.3827,-0.7071,1,-0.7071,-0.7071,0,-0.7071,-0.9239,0,-0.3827],
// 5 24 -0.9239 0 -0.3827 -0.9239 1 -0.3827 -0.7071 0 -0.7071 -1 0 0
  [5,24,-0.9239,0,-0.3827,-0.9239,1,-0.3827,-0.7071,0,-0.7071,-1,0,0],
// 4 16 -0.7071 1 -0.7071 -0.3827 1 -0.9239 -0.3827 0 -0.9239 -0.7071 0 -0.7071
  [4,16,-0.7071,1,-0.7071,-0.3827,1,-0.9239,-0.3827,0,-0.9239,-0.7071,0,-0.7071],
// 5 24 -0.7071 0 -0.7071 -0.7071 1 -0.7071 -0.3827 0 -0.9239 -0.9239 0 -0.3827
  [5,24,-0.7071,0,-0.7071,-0.7071,1,-0.7071,-0.3827,0,-0.9239,-0.9239,0,-0.3827],
// 4 16 -0.3827 1 -0.9239 0 1 -1 0 0 -1 -0.3827 0 -0.9239
  [4,16,-0.3827,1,-0.9239,0,1,-1,0,0,-1,-0.3827,0,-0.9239],
// 5 24 -0.3827 0 -0.9239 -0.3827 1 -0.9239 0 0 -1 -0.7071 0 -0.7071
  [5,24,-0.3827,0,-0.9239,-0.3827,1,-0.9239,0,0,-1,-0.7071,0,-0.7071],
// 4 16 0 1 -1 0.3827 1 -0.9239 0.3827 0 -0.9239 0 0 -1
  [4,16,0,1,-1,0.3827,1,-0.9239,0.3827,0,-0.9239,0,0,-1],
// 5 24 0 0 -1 0 1 -1 0.3827 0 -0.9239 -0.3827 0 -0.9239
  [5,24,0,0,-1,0,1,-1,0.3827,0,-0.9239,-0.3827,0,-0.9239],
// 4 16 0.3827 1 -0.9239 0.7071 1 -0.7071 0.7071 0 -0.7071 0.3827 0 -0.9239
  [4,16,0.3827,1,-0.9239,0.7071,1,-0.7071,0.7071,0,-0.7071,0.3827,0,-0.9239],
// 5 24 0.3827 0 -0.9239 0.3827 1 -0.9239 0.7071 0 -0.7071 0 0 -1
  [5,24,0.3827,0,-0.9239,0.3827,1,-0.9239,0.7071,0,-0.7071,0,0,-1],
// 4 16 0.7071 1 -0.7071 0.9239 1 -0.3827 0.9239 0 -0.3827 0.7071 0 -0.7071
  [4,16,0.7071,1,-0.7071,0.9239,1,-0.3827,0.9239,0,-0.3827,0.7071,0,-0.7071],
// 5 24 0.7071 0 -0.7071 0.7071 1 -0.7071 0.9239 0 -0.3827 0.3827 0 -0.9239
  [5,24,0.7071,0,-0.7071,0.7071,1,-0.7071,0.9239,0,-0.3827,0.3827,0,-0.9239],
// 4 16 0.9239 1 -0.3827 1 1 0 1 0 0 0.9239 0 -0.3827
  [4,16,0.9239,1,-0.3827,1,1,0,1,0,0,0.9239,0,-0.3827],
// 5 24 0.9239 0 -0.3827 0.9239 1 -0.3827 1 0 0 0.7071 0 -0.7071
  [5,24,0.9239,0,-0.3827,0.9239,1,-0.3827,1,0,0,0.7071,0,-0.7071],
// 0
];
module ldraw_lib__4_4cyli(step=0, col=false, unit=2/5, alt=false, line=0.2, solid=!$preview)
    makepoly(ldraw_lib__4_4cyli(), step=step, col=col, unit=unit, alt=alt, line=line, solid=solid);
ldraw_lib__4_4cyli(line=0.2);
// file: 3062b.scad
use <../lib.scad>
use <../p/4-4cyli.scad>
use <s/3062bs01.scad>
function ldraw_lib__3062b() = [
// 0 Brick  1 x  1 Round with Hollow Stud
// 0 Name: 3062b.dat
// 0 Author: James Jessiman
// 0 !LDRAW_ORG Part UPDATE 2022-02
// 0 !LICENSE Licensed under CC BY 4.0 : see CAreadme.txt
// 
// 0 BFC CERTIFY CCW
  [0,"BFC","CERTIFY"],
  [0,"BFC","CCW"],
// 
// 0 !KEYWORDS BrickLink 3062
// 
// 0 !HISTORY 1998-06-20 [PTadmin] Official Update 1998-06
// 0 !HISTORY 2003-08-02 [OrionP] Made some primitive subs
// 0 !HISTORY 2003-08-04 [Steffen] replaced peghole.dat by stud4a.dat
// 0 !HISTORY 2003-12-19 [PTadmin] Official Update 2003-03
// 0 !HISTORY 2007-06-10 [PTadmin] Header formatted for Contributor Agreement
// 0 !HISTORY 2008-07-01 [PTadmin] Official Update 2008-01
// 0 !HISTORY 2009-03-19 [tchang] Add missing <CR>
// 0 !HISTORY 2009-09-03 [PTadmin] Official Update 2009-02
// 0 !HISTORY 2020-12-12 [RainbowDolphin] Subparted for patterns
// 0 !HISTORY 2022-03-06 [PTadmin] Official Update 2022-02
// 
// 
// 1 16 0 0 0 1 0 0 0 1 0 0 0 1 s\3062bs01.dat
  [1,16,0,0,0,1,0,0,0,1,0,0,0,1, ldraw_lib__s__3062bs01()],
// 1 16 0 0 0 10 0 0 0 19 0 0 0 10 4-4cyli.dat
  [1,16,0,0,0,10,0,0,0,19,0,0,0,10, ldraw_lib__4_4cyli()],
];
module ldraw_lib__3062b(step=0, col=false, unit=2/5, alt=false, line=0.2, solid=!$preview)
    makepoly(ldraw_lib__3062b(), step=step, col=col, unit=unit, alt=alt, line=line, solid=solid);
ldraw_lib__3062b(line=0.2);
// main file
use <../lib.scad>
use <3062b.scad>
function ldraw_lib__35390() = [
// 0 =Brick  1 x  1 Round with Hollow Stud
// 0 Name: 35390.dat
// 0 Author: Massimo Maso [Sirio]
// 0 !LDRAW_ORG Part Alias UPDATE 2025-06
// 0 !LICENSE Licensed under CC BY 4.0 : see CAreadme.txt
// 
// 0 BFC CERTIFY CCW
  [0,"BFC","CERTIFY"],
  [0,"BFC","CCW"],
// 
// 0 !KEYWORDS BrickLink 3062, Rebrickable 3062b
// 
// 0 !HISTORY 2025-06-26 [OrionP] Official Update 2025-06
// 
// 1 16 0 0 0 1 0 0 0 1 0 0 0 1 3062b.dat
  [1,16,0,0,0,1,0,0,0,1,0,0,0,1, ldraw_lib__3062b()],
];
module ldraw_lib__35390(step=0, col=false, unit=2/5, alt=false, line=0.2, solid=!$preview)
    makepoly(ldraw_lib__35390(), step=step, col=col, unit=unit, alt=alt, line=line, solid=solid);
ldraw_lib__35390(line=0.2);
